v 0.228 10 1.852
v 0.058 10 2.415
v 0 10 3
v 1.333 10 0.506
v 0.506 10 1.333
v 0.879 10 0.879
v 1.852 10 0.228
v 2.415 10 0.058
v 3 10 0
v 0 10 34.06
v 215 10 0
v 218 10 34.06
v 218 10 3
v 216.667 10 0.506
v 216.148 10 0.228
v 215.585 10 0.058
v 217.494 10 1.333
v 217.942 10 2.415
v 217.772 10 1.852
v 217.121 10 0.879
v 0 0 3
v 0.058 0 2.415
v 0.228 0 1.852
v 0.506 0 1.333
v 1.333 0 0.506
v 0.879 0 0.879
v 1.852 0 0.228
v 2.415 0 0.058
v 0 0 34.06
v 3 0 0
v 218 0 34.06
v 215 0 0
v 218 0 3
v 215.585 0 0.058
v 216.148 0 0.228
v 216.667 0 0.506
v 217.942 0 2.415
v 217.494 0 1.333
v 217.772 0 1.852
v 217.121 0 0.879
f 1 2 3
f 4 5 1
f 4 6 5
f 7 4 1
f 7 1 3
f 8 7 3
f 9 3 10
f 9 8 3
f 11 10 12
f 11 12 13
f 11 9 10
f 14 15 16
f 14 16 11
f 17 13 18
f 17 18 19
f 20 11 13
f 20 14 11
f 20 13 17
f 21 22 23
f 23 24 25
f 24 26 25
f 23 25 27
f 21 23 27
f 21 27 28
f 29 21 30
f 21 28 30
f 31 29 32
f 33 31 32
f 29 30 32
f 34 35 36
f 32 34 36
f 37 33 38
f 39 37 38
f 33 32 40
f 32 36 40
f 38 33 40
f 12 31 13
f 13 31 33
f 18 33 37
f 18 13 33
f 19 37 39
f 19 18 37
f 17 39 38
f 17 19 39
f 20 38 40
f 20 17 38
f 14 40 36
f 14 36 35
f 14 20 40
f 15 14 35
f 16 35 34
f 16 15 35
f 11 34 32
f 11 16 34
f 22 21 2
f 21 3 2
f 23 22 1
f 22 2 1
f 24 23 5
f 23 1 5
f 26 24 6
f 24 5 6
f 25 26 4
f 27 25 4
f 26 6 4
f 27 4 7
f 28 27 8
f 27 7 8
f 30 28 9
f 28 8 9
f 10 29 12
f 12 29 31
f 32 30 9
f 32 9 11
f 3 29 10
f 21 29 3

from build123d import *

# Parameters (mm, degrees)
SKETCH_1_W      = 218
SKETCH_1_H      = 34.06
EXTRUDE_1_DEPTH = 10
FILLET_1_R      = 3


with BuildPart() as part:
    # 草图1 → 凸台-拉伸1 (new body)
    with BuildSketch(Plane(origin=(0, 0, 0), x_dir=(1, 0, 0), z_dir=(0, 1, 0))):
        with Locations((109, -17.03)):
            Rectangle(SKETCH_1_W, SKETCH_1_H)
    extrude(amount=EXTRUDE_1_DEPTH)

    # 圆角1
    fillet_1_edges = [part.edges().sort_by_distance(p)[0] for p in [
        (0, 5, 0),
        (218, 5, 0),
    ]]
    fillet(fillet_1_edges, radius=FILLET_1_R)


solid = part.part
